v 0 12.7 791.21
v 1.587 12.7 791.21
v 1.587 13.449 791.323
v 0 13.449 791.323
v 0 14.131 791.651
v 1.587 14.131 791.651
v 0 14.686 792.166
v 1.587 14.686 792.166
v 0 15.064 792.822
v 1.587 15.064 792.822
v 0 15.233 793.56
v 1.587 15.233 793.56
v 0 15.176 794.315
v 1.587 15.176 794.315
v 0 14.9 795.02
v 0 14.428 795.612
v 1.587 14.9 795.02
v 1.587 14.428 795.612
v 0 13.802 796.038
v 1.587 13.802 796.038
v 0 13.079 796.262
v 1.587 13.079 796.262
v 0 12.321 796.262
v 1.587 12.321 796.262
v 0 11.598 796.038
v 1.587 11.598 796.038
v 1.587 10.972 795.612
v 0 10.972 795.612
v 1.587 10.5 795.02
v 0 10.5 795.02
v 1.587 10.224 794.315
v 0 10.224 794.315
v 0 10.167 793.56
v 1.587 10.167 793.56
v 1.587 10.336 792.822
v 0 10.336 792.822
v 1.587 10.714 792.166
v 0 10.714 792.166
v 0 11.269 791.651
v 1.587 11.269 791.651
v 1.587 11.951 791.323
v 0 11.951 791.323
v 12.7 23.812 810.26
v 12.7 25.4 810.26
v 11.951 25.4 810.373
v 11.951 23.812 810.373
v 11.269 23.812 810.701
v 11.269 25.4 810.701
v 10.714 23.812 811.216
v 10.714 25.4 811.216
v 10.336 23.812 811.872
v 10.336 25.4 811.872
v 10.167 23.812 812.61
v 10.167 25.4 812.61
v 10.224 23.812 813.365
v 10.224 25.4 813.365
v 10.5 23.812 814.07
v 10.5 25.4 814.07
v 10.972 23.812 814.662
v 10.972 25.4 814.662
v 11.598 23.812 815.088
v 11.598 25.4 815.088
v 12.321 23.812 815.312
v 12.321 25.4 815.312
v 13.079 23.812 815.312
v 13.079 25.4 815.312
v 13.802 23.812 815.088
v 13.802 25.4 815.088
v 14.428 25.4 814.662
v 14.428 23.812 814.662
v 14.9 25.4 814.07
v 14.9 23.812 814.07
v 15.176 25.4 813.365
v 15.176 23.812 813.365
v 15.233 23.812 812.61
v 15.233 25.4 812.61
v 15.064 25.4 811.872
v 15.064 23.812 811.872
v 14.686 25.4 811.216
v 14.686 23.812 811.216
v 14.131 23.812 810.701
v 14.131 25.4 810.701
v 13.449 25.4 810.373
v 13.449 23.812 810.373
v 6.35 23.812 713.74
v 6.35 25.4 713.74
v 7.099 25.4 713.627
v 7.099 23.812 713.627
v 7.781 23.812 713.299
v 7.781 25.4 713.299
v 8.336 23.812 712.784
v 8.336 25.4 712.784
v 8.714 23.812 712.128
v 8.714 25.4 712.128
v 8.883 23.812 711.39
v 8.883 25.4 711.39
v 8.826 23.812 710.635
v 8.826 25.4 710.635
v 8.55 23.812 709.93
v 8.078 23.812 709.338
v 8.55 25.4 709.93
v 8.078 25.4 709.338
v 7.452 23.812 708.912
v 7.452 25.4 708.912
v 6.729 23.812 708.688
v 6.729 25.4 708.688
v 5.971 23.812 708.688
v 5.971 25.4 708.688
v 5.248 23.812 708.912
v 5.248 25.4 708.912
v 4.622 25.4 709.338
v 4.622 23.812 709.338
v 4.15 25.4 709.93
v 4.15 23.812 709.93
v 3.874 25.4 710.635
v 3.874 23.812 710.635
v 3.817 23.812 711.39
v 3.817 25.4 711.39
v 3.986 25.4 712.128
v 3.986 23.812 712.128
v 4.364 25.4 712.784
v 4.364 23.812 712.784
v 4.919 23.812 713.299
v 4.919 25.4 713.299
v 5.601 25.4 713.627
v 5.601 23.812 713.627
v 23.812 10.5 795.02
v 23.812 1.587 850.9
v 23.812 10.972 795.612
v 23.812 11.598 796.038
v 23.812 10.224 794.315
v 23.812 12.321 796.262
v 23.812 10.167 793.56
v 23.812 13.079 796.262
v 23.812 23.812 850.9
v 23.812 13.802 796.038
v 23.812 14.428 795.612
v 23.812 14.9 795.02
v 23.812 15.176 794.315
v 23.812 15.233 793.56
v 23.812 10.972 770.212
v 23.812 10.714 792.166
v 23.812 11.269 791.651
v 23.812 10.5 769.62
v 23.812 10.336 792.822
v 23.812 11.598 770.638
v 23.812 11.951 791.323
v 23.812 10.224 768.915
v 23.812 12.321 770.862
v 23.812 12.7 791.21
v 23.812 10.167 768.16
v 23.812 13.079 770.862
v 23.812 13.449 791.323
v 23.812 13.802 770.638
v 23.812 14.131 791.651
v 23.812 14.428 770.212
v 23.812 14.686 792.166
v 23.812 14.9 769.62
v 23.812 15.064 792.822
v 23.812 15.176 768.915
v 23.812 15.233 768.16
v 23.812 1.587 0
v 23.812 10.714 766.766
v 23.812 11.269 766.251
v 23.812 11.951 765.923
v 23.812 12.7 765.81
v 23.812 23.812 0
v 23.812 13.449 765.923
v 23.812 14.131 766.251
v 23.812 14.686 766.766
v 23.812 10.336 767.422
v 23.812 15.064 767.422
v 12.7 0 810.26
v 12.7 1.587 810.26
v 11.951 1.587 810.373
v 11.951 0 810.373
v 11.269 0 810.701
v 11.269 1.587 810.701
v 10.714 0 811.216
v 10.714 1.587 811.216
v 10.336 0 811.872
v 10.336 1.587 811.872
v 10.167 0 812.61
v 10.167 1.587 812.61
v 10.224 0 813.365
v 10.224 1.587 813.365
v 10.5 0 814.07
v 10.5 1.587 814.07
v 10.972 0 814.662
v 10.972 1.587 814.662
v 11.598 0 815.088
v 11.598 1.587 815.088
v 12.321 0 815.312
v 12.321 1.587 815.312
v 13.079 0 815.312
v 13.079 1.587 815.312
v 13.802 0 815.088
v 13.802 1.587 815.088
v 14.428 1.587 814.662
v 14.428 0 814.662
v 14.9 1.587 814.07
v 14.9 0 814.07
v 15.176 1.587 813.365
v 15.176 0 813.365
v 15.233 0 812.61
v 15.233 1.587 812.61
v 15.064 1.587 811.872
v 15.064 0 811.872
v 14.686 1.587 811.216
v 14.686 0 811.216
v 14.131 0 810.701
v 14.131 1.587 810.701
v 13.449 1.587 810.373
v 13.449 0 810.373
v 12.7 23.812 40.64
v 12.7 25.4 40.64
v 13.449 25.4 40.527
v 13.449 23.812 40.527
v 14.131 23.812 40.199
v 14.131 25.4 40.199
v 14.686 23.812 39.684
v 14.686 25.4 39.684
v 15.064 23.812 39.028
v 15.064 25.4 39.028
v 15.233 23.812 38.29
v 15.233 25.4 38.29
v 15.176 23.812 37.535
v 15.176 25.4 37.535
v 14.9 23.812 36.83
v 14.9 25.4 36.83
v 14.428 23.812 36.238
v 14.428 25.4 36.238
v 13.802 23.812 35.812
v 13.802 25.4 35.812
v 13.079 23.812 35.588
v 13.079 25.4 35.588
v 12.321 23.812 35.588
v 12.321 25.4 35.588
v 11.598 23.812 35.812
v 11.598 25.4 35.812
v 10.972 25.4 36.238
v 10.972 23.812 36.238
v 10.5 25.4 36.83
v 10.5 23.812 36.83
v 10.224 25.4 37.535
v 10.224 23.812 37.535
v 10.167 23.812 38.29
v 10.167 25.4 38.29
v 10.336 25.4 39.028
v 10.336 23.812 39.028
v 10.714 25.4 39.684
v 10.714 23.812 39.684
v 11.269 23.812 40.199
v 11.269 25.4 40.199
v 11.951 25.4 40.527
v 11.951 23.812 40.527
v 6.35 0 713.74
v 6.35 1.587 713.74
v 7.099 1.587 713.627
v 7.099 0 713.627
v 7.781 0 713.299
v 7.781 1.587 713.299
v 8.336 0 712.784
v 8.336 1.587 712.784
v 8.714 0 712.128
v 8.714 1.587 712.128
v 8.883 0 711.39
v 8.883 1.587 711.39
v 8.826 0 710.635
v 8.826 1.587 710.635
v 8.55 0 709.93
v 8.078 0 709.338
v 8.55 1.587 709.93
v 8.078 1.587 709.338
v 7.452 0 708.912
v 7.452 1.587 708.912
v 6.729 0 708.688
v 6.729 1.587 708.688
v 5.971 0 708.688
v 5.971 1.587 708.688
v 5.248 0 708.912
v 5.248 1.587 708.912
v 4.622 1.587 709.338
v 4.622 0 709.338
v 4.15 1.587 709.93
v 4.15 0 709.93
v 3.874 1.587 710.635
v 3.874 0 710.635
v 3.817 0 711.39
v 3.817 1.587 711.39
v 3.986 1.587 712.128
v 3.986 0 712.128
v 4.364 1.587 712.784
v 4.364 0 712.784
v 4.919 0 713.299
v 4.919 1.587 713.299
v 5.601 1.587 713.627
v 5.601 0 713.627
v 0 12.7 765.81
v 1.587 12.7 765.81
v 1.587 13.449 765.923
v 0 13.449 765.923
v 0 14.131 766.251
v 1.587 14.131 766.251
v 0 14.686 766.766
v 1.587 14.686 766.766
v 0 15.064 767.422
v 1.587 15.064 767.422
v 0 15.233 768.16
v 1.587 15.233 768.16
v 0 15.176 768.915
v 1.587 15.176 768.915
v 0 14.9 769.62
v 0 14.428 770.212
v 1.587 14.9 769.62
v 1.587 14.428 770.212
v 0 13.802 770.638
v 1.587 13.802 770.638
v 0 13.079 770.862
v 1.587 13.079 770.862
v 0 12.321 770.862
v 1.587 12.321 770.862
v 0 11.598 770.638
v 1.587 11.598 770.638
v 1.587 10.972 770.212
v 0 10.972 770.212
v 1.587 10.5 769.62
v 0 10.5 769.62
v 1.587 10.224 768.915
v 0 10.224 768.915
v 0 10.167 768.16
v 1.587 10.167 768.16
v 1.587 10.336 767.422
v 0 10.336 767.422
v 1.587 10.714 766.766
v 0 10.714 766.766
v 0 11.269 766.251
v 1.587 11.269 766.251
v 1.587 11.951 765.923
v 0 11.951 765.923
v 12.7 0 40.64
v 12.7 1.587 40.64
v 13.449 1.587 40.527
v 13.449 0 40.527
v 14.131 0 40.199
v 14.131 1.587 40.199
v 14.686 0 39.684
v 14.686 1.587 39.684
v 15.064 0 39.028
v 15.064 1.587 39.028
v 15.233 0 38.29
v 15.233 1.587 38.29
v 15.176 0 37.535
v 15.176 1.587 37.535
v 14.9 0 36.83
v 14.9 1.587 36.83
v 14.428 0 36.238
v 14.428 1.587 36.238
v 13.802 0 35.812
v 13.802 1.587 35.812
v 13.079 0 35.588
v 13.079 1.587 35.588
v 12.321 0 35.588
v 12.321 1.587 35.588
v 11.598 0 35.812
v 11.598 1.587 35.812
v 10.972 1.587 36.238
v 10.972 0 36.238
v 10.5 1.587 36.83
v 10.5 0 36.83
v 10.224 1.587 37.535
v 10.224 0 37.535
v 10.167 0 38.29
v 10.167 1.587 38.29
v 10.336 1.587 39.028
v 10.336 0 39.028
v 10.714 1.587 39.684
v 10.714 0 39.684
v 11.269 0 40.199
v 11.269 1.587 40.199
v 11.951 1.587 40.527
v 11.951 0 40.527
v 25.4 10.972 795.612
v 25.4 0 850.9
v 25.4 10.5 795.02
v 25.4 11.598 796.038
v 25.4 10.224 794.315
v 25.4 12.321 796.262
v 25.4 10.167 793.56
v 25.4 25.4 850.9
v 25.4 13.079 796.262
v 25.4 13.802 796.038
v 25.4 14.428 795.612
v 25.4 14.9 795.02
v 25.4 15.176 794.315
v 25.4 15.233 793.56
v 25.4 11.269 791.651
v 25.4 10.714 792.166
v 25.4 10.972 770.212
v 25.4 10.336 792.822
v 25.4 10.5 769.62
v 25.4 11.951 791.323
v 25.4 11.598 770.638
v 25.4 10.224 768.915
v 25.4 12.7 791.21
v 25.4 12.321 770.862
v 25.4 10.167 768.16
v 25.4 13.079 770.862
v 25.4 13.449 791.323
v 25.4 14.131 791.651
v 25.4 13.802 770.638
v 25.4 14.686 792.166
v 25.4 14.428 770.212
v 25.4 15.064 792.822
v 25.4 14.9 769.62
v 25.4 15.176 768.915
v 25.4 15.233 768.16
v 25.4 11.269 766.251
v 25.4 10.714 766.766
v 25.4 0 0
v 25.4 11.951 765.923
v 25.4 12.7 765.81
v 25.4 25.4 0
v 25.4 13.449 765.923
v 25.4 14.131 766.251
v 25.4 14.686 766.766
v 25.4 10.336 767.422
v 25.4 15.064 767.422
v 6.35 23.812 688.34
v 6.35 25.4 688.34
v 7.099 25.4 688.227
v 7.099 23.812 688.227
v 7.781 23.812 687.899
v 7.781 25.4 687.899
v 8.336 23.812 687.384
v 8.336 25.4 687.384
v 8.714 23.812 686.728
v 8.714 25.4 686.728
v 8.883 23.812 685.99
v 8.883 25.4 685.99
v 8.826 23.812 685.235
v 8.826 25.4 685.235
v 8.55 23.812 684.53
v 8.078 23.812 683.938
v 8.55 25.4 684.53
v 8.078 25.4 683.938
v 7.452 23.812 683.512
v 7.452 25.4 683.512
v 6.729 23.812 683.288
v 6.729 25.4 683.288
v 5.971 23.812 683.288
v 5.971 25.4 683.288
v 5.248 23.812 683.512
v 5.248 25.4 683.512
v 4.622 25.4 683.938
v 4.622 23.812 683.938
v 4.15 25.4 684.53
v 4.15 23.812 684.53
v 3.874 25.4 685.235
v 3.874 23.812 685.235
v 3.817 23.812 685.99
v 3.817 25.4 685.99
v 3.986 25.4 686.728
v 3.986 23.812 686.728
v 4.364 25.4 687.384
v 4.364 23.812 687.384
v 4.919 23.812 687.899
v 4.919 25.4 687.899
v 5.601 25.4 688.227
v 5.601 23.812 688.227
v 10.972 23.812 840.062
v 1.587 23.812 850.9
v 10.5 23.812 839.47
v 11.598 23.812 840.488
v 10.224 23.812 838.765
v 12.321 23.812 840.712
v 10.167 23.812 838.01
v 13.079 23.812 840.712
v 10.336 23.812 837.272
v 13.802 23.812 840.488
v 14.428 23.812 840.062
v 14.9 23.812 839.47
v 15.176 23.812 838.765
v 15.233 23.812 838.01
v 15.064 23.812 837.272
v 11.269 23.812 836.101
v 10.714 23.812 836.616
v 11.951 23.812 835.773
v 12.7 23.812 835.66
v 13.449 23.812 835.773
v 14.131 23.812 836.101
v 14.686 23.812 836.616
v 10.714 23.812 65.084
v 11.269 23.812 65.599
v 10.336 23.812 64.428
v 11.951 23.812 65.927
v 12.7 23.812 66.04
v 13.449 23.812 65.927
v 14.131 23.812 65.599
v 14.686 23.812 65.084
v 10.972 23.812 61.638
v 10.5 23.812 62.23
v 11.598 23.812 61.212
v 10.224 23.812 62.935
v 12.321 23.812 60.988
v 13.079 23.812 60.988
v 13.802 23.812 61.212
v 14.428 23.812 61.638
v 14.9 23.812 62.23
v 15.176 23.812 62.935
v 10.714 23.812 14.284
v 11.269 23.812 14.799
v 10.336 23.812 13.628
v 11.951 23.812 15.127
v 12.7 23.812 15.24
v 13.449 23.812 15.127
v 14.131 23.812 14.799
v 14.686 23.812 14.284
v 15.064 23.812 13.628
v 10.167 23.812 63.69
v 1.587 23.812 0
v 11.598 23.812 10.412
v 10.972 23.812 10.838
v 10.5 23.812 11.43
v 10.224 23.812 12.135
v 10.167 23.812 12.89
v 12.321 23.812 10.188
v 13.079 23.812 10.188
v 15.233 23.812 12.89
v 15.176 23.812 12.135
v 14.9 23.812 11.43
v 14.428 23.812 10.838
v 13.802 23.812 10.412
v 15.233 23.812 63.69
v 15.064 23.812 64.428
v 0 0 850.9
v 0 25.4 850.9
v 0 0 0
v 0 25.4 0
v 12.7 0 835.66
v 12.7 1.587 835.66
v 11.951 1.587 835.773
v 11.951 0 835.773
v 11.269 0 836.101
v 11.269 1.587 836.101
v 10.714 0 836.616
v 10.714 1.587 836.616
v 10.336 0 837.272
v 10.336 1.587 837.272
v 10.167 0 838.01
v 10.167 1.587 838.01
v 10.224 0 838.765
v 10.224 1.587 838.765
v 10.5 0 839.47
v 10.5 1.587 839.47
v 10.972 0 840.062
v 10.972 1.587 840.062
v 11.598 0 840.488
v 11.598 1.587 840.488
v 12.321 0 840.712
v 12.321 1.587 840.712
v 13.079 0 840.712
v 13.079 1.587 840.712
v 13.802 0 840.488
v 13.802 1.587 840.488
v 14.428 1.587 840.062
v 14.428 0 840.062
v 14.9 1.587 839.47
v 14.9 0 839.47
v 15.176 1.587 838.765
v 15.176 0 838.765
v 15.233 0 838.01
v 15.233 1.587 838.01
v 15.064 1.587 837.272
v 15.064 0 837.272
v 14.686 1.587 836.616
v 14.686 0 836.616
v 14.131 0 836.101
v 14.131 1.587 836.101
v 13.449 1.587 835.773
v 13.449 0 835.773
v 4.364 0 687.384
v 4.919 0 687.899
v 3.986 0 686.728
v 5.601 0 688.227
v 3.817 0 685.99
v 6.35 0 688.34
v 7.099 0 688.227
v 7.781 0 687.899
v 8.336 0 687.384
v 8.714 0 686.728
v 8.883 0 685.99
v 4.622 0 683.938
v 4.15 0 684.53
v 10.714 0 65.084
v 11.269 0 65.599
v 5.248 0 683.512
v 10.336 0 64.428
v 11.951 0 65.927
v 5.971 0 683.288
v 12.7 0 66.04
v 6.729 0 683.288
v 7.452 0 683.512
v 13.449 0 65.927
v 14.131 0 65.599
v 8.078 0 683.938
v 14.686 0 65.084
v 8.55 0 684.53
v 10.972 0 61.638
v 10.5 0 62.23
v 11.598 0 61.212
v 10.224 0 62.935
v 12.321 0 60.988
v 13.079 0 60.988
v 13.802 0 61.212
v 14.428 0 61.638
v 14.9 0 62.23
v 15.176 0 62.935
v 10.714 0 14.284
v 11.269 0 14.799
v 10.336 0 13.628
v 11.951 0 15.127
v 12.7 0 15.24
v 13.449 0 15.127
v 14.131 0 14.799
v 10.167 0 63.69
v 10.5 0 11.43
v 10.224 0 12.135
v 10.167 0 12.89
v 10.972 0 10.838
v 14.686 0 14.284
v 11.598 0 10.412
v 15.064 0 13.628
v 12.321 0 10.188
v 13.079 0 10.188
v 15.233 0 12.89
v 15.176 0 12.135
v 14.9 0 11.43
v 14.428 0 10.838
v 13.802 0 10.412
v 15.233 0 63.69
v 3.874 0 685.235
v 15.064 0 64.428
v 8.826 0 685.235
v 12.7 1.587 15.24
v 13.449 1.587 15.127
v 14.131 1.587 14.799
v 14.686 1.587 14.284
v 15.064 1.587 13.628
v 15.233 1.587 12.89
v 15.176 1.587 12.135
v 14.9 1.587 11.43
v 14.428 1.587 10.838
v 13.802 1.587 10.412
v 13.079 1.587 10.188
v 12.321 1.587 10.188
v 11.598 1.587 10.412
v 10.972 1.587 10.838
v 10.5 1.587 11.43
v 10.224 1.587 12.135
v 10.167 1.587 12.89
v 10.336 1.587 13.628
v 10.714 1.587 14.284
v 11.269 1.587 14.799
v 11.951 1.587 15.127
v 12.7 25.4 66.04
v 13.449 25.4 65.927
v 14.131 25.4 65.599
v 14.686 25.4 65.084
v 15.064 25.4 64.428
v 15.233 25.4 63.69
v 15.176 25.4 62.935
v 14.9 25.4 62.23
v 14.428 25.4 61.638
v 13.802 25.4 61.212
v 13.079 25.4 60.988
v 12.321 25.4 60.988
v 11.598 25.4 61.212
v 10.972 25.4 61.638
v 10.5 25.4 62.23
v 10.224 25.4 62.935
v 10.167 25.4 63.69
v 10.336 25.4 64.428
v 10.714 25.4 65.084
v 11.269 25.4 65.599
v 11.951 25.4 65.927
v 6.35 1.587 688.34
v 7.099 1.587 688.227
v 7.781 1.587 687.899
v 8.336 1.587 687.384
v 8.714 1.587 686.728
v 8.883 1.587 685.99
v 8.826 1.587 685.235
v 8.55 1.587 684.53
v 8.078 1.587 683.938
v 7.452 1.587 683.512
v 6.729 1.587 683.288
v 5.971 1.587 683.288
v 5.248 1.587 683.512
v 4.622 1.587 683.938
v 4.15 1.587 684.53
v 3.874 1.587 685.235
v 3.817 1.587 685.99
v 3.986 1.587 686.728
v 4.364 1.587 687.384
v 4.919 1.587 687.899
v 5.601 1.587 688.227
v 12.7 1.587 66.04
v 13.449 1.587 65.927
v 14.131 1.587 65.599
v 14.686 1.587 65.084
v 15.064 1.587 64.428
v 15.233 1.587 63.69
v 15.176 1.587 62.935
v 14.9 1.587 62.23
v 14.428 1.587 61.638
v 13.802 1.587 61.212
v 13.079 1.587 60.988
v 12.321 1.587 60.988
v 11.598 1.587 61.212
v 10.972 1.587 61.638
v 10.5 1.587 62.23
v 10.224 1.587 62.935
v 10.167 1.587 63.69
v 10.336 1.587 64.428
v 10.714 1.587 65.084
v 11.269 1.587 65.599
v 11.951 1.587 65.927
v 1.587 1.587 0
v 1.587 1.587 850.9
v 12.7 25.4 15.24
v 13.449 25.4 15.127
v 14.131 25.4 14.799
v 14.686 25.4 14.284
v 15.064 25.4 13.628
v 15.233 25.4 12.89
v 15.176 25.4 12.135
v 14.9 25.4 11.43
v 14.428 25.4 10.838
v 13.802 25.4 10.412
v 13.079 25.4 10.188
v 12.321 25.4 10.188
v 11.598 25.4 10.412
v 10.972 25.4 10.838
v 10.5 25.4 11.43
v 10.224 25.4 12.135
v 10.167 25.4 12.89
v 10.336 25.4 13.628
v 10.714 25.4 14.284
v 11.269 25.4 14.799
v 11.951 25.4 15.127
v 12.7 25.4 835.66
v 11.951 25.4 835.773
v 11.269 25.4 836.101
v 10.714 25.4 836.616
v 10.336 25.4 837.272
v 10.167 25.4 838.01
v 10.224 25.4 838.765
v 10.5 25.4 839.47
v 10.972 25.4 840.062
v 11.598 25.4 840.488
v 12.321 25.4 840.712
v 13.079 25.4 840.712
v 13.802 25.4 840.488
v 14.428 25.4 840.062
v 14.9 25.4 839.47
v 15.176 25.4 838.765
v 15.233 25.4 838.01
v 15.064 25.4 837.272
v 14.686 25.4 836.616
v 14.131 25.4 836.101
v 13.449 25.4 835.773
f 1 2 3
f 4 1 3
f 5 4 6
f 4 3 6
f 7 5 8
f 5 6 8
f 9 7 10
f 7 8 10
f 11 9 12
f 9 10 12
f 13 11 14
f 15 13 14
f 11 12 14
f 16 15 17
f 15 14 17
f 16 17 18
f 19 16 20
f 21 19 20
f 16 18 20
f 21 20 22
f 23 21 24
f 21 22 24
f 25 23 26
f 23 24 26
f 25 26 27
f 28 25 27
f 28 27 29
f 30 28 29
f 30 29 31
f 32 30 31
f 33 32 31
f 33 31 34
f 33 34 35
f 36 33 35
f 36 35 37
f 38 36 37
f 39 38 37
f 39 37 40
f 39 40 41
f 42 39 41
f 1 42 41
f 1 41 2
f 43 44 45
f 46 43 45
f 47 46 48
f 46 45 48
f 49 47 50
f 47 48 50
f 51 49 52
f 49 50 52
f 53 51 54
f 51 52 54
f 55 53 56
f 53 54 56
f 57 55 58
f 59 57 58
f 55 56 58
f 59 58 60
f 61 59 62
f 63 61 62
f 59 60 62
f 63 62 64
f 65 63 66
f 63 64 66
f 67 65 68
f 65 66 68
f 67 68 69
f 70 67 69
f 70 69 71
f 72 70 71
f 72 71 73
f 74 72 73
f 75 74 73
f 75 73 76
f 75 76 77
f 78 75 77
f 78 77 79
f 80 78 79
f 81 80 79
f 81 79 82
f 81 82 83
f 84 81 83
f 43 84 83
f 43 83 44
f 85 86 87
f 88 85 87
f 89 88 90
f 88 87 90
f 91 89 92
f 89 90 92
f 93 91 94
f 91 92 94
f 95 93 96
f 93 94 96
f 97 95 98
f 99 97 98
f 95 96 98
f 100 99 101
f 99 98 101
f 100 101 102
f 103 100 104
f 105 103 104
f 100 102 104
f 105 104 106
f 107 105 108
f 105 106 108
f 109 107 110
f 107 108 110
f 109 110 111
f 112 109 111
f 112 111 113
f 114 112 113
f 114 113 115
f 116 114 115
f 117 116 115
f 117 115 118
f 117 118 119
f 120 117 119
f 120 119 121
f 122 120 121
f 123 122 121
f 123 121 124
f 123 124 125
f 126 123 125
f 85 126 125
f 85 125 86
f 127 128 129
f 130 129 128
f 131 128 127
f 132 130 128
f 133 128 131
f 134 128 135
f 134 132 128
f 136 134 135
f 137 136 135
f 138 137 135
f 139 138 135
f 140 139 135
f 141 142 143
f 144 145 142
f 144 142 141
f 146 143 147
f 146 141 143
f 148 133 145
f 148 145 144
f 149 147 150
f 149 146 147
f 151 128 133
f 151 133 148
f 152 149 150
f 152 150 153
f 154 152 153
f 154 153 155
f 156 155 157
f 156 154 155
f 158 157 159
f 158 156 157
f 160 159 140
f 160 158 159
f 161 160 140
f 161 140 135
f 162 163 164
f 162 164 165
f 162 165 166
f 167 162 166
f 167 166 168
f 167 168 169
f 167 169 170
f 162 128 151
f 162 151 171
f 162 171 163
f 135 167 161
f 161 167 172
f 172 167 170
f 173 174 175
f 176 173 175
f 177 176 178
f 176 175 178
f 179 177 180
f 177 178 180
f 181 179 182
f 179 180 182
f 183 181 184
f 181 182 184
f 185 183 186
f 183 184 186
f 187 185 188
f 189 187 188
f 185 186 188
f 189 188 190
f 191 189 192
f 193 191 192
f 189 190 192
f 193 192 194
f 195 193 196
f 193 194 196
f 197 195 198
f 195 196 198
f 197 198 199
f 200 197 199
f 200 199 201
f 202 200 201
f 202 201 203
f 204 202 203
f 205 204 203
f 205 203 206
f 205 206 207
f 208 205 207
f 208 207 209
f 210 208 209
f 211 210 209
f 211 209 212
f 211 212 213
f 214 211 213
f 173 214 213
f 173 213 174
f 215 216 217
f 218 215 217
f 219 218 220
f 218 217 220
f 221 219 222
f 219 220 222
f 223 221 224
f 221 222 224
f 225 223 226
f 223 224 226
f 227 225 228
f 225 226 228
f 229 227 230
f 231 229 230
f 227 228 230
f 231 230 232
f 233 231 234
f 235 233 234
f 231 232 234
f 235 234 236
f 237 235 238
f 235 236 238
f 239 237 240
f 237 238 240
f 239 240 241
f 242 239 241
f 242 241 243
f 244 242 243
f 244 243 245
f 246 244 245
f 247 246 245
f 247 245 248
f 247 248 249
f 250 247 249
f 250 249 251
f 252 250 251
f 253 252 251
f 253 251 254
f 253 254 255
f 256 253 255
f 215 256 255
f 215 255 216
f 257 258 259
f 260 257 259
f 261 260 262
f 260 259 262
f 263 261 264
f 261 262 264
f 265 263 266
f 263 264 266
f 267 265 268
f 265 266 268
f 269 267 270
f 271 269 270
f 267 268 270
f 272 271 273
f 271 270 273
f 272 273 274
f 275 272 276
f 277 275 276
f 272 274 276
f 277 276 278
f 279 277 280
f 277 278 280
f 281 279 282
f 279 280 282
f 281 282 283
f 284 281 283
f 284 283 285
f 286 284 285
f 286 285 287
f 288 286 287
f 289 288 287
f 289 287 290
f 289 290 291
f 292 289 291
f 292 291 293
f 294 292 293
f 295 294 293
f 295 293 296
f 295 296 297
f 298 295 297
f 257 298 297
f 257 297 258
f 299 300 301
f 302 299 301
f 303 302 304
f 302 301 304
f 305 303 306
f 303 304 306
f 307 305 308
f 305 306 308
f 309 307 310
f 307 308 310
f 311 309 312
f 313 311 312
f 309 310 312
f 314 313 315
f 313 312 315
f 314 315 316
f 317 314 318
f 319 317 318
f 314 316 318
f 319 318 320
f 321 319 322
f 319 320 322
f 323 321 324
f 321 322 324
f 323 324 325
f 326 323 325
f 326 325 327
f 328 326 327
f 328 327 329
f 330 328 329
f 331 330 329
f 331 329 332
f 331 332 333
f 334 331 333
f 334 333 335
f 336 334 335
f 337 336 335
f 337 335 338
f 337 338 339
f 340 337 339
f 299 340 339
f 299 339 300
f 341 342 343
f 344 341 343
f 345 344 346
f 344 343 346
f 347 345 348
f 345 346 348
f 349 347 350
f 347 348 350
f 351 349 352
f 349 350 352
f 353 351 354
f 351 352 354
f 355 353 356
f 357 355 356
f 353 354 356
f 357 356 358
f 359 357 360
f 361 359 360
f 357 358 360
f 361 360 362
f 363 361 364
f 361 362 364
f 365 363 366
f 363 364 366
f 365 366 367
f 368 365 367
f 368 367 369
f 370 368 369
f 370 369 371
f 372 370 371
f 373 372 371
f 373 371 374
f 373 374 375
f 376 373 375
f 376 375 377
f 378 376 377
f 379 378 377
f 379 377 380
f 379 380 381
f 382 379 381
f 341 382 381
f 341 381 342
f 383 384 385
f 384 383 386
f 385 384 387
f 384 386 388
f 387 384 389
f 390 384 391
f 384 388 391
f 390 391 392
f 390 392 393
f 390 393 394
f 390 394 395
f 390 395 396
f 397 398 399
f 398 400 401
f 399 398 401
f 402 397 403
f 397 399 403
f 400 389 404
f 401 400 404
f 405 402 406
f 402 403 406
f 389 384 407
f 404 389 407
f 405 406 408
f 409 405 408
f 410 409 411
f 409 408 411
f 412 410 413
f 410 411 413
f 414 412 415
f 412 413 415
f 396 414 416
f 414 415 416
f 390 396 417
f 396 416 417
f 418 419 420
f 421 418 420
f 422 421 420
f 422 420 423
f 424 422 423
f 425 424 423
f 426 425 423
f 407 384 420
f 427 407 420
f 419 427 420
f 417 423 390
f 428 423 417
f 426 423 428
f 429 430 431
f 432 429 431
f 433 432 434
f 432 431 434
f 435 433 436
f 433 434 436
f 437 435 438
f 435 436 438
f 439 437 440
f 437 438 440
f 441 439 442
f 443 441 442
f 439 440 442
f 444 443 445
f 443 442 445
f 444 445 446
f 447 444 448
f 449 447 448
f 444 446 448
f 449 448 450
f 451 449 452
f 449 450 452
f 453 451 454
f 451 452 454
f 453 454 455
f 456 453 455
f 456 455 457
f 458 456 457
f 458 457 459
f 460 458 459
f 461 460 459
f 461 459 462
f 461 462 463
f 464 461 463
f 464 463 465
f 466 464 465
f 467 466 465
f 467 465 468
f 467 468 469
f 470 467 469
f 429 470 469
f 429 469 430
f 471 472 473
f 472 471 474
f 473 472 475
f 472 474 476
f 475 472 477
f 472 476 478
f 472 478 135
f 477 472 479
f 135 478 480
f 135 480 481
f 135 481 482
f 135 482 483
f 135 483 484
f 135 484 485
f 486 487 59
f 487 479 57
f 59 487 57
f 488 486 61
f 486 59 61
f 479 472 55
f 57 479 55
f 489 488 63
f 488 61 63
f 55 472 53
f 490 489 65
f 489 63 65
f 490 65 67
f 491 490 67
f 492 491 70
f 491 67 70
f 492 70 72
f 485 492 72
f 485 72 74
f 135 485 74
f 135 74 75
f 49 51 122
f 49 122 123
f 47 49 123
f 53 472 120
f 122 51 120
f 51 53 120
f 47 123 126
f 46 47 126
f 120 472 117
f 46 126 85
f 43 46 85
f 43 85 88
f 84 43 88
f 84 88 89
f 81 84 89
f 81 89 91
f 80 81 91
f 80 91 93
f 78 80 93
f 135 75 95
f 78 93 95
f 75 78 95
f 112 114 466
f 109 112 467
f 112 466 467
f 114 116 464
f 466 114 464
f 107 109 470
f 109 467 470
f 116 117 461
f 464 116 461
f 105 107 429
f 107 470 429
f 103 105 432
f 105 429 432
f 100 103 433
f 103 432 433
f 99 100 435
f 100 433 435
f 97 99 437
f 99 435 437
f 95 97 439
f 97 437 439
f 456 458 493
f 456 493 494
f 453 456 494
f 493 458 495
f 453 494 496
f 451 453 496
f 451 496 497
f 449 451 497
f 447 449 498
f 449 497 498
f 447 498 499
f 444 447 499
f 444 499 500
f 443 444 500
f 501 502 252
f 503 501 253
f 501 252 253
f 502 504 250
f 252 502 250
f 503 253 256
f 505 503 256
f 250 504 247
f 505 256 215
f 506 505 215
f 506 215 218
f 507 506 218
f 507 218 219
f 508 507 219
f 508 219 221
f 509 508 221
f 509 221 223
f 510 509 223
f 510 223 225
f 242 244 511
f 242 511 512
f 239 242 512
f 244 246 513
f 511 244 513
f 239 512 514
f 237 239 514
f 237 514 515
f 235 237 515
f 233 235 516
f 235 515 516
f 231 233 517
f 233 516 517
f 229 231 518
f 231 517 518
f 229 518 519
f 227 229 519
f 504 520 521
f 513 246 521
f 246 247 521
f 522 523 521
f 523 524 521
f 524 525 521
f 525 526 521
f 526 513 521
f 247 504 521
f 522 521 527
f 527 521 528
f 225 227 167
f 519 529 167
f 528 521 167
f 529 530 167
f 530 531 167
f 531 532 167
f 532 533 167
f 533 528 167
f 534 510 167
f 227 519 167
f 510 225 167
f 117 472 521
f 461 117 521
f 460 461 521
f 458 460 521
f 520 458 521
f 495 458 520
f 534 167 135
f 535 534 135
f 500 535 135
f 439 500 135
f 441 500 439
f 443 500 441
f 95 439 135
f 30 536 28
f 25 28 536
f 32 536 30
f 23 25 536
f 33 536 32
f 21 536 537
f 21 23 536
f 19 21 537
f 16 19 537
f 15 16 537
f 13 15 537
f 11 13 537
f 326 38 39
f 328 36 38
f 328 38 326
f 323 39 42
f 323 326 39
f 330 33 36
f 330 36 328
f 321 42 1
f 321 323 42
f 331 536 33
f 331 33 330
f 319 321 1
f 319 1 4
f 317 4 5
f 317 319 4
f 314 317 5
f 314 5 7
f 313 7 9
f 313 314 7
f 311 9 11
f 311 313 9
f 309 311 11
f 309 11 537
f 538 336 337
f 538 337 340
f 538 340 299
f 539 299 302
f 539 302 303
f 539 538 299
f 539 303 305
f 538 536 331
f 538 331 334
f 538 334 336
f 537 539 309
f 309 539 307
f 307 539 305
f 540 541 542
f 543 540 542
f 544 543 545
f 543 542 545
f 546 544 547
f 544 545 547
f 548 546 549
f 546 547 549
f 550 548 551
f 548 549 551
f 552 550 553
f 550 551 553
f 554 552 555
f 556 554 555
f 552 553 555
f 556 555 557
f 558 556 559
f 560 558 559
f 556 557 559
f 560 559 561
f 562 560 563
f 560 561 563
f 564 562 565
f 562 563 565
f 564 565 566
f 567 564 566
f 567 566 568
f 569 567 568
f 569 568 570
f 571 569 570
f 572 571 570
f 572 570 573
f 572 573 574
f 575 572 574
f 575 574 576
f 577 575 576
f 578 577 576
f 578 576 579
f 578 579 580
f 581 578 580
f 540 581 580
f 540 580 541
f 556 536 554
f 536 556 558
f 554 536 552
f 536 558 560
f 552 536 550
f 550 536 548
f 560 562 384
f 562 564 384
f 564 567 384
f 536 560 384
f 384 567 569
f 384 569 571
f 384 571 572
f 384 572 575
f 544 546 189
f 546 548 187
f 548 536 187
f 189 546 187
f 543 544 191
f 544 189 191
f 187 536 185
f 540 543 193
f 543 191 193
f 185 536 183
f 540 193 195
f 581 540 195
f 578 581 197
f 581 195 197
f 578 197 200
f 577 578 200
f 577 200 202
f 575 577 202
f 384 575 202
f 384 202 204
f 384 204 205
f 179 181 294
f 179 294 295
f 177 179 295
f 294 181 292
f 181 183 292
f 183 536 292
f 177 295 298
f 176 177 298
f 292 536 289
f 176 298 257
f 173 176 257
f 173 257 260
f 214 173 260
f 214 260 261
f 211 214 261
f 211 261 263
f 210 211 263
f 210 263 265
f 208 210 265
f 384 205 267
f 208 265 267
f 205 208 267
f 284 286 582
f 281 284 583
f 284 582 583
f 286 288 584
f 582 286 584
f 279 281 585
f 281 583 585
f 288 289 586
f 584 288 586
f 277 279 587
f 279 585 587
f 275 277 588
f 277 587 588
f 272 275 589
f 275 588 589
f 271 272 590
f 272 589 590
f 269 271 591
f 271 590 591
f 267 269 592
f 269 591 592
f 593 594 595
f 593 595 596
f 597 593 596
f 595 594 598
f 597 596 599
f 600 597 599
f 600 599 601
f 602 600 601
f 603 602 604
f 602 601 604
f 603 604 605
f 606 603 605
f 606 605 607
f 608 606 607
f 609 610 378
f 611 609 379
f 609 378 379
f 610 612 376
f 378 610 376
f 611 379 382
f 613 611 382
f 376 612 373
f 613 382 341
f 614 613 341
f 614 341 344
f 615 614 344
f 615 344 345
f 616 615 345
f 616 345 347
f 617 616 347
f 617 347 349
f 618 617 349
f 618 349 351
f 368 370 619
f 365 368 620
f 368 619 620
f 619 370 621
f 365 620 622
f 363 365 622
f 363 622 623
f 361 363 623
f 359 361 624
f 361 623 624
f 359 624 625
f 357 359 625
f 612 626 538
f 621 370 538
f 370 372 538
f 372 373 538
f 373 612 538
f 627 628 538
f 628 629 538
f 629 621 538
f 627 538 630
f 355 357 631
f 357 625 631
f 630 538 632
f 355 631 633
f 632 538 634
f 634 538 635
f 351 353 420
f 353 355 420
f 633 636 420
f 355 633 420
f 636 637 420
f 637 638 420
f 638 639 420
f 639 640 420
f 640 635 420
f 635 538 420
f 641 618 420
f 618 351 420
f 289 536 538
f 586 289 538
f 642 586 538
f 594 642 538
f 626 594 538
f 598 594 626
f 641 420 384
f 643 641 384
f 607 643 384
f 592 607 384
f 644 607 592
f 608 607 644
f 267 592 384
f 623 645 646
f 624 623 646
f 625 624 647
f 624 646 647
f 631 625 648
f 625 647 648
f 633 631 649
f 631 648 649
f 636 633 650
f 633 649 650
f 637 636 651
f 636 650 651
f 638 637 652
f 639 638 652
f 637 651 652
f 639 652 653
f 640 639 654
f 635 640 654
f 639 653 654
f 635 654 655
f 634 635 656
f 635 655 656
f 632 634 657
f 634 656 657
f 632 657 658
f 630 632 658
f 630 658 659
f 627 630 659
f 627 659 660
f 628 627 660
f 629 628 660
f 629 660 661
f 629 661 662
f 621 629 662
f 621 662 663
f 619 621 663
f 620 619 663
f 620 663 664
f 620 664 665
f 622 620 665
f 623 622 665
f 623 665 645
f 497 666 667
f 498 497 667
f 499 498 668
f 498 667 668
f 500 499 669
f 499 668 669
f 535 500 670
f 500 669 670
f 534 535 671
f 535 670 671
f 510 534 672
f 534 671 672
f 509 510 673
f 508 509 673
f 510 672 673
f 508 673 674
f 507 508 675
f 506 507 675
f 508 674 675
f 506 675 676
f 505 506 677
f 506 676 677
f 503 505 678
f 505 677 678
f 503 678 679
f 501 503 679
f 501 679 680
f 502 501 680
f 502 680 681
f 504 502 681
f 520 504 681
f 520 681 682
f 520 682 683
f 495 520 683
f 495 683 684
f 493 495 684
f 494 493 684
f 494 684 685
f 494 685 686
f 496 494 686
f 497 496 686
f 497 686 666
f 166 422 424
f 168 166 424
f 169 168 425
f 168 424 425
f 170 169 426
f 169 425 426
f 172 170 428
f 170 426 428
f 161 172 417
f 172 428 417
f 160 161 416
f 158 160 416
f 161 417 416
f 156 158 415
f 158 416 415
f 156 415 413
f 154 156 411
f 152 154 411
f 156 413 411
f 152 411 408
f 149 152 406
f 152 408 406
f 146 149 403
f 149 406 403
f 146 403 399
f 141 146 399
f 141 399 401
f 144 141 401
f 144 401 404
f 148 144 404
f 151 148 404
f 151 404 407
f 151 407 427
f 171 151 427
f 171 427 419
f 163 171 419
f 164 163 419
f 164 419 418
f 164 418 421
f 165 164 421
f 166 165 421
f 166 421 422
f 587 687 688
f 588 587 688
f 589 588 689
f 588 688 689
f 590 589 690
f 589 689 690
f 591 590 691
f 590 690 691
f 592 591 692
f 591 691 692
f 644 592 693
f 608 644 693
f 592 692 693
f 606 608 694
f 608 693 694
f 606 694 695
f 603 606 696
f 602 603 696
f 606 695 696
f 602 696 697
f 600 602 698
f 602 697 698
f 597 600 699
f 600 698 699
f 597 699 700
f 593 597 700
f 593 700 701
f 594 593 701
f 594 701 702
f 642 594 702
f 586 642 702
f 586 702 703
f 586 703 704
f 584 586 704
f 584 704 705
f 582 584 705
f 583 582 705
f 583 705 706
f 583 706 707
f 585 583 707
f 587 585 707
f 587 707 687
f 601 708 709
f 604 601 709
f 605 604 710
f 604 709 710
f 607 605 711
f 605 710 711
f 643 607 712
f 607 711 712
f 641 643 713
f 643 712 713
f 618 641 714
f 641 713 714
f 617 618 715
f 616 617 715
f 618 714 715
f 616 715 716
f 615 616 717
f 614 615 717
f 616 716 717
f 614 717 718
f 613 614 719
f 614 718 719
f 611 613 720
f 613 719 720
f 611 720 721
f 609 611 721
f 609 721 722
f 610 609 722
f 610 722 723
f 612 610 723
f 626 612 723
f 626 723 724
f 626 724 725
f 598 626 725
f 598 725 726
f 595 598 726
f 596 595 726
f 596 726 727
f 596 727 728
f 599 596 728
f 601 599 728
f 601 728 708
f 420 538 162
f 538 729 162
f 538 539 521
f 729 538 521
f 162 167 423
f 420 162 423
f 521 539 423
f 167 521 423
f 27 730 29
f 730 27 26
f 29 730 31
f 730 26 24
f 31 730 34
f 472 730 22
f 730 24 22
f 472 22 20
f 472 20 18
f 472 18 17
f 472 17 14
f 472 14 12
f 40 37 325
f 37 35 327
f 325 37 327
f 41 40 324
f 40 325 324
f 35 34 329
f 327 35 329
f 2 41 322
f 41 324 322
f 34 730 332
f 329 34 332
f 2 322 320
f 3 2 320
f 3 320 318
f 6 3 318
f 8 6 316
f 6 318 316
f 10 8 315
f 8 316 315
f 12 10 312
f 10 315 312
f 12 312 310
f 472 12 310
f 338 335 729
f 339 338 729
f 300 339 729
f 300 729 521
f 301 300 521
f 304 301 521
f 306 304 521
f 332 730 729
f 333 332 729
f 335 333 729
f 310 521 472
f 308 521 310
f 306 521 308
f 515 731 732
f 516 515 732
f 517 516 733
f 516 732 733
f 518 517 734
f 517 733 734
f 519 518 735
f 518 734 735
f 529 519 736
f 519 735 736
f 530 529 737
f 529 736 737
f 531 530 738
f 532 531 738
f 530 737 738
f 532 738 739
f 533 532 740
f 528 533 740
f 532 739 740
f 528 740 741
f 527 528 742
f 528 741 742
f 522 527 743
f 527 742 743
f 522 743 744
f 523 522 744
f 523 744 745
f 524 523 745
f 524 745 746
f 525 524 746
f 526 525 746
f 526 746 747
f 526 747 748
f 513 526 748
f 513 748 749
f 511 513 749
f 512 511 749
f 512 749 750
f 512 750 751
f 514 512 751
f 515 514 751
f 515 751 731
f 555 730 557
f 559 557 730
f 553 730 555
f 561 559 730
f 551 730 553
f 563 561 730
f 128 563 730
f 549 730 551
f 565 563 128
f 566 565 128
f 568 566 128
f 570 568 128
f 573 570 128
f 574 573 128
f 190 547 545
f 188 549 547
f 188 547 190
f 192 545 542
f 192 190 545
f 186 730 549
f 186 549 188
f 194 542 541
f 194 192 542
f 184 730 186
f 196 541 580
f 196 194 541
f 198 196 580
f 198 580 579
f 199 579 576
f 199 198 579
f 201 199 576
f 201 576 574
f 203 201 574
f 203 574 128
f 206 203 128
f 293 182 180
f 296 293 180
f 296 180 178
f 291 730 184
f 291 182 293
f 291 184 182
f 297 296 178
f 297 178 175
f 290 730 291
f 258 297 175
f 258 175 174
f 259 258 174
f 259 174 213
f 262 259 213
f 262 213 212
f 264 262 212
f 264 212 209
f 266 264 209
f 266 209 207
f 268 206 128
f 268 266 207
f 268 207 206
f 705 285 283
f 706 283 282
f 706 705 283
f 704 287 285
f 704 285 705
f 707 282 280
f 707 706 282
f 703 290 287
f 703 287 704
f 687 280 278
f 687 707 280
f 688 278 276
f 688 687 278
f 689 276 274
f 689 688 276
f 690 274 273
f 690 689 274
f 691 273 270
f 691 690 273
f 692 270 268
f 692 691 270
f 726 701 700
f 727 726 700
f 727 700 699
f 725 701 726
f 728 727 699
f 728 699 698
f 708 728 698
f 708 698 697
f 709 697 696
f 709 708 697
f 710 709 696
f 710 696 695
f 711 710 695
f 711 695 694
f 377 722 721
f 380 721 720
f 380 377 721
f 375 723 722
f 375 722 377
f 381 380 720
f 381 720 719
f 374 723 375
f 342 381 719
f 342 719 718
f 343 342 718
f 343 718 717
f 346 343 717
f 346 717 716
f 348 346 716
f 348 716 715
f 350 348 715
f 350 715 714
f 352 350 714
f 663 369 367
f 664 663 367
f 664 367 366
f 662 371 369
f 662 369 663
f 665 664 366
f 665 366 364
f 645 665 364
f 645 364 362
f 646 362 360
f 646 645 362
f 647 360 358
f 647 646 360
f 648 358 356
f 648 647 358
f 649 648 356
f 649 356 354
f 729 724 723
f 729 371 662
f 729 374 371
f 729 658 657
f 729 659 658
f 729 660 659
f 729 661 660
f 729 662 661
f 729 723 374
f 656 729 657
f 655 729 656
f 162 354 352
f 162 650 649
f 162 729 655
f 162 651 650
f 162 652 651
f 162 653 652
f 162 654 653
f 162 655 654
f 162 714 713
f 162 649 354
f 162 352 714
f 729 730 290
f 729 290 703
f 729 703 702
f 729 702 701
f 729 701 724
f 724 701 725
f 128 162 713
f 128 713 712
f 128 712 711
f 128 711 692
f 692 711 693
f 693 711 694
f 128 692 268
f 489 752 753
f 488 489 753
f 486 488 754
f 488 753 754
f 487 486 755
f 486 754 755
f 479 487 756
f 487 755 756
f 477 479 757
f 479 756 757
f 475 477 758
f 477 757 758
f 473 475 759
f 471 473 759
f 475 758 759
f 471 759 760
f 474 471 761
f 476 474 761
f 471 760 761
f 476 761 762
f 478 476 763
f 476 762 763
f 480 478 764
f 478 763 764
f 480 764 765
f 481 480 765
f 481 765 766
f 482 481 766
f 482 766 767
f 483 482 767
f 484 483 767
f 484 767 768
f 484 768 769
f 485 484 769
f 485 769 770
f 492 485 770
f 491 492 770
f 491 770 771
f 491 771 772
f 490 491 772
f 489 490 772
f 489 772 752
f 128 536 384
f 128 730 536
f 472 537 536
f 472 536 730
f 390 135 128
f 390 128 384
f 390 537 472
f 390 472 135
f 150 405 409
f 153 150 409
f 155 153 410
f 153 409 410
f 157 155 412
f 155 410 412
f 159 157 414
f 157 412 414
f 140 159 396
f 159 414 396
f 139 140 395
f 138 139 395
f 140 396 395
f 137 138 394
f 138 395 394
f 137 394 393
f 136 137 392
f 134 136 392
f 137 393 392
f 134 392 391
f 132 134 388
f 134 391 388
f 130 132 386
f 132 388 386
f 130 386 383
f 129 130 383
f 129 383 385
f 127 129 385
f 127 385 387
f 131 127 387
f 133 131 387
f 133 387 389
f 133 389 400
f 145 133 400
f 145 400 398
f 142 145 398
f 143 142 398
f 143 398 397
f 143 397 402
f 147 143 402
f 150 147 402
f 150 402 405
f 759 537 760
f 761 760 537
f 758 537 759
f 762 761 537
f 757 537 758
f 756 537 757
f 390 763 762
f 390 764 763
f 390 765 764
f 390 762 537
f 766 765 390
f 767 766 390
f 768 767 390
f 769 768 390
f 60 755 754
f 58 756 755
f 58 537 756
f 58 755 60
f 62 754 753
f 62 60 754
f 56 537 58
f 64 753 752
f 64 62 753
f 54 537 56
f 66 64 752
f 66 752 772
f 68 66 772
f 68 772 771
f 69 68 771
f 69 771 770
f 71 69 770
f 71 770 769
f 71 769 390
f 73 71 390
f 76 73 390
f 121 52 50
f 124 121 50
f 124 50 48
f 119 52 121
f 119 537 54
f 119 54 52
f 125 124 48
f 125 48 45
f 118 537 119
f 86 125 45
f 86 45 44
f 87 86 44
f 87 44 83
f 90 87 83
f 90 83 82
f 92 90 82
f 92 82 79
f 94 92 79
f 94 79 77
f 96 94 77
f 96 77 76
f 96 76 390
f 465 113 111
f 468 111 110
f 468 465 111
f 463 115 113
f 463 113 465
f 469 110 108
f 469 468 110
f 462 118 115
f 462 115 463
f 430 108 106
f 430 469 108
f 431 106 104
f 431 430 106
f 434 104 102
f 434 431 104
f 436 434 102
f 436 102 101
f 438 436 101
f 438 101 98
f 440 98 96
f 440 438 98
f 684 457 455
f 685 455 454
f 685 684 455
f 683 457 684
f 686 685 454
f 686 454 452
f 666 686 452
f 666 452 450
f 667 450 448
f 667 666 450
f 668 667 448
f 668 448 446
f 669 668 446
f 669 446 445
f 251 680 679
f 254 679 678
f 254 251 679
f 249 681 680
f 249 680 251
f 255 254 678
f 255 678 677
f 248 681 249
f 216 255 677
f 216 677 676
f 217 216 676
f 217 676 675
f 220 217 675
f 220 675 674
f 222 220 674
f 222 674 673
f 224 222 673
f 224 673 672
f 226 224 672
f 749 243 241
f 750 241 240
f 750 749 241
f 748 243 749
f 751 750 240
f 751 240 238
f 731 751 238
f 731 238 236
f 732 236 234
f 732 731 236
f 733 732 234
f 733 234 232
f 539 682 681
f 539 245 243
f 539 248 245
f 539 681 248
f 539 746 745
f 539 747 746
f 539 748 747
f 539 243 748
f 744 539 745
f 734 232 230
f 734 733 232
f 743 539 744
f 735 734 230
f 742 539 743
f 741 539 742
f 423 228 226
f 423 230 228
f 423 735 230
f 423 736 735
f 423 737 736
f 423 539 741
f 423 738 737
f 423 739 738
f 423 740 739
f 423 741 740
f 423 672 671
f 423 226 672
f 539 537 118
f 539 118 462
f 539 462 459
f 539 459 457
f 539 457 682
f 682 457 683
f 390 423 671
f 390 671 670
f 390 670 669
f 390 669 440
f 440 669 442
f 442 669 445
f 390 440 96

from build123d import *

# Parameters (mm, degrees)
SKETCH1_W           = 25.4
SKETCH1_H           = 25.4
SKETCH1_W_2         = 22.225
SKETCH1_H_2         = 22.225
BOSS_EXTRUDE1_DEPTH = 850.9
SKETCH3_R           = 2.54
CUT_EXTRUDE2_DEPTH  = 852.657871448
SKETCH4_R           = 2.54
CUT_EXTRUDE3_DEPTH  = 852.657871448


with BuildPart() as part:
    # Sketch1 → Boss-Extrude1 (new body)
    with BuildSketch(Plane.XY):
        with Locations((12.7, 12.7)):
            Rectangle(SKETCH1_W, SKETCH1_H)
        with Locations((12.7, 12.7)):
            Rectangle(SKETCH1_W_2, SKETCH1_H_2, mode=Mode.SUBTRACT)
    extrude(amount=BOSS_EXTRUDE1_DEPTH)

    # Sketch3 → Cut-Extrude2 (cut, through all)
    with BuildSketch(Plane(origin=(0, 25.4, 0), x_dir=(1, 0, 0), z_dir=(0, 1, 0))):
        with Locations(Location((12.7, -812.8, 0), (0, 0, 90))):
            Circle(SKETCH3_R)
        with Locations(Location((12.7, -838.2, 0), (0, 0, 90))):
            Circle(SKETCH3_R)
        with Locations(Location((12.7, -12.7, 0), (0, 0, 270))):
            Circle(SKETCH3_R)
        with Locations(Location((12.7, -38.1, 0), (0, 0, 270))):
            Circle(SKETCH3_R)
        with Locations(Location((12.7, -63.5, 0), (0, 0, 270))):
            Circle(SKETCH3_R)
        with Locations(Location((6.35, -711.2, 0), (0, 0, 270))):
            Circle(SKETCH3_R)
        with Locations(Location((6.35, -685.8, 0), (0, 0, 270))):
            Circle(SKETCH3_R)
    extrude(amount=-CUT_EXTRUDE2_DEPTH, mode=Mode.SUBTRACT)

    # Sketch4 → Cut-Extrude3 (cut, through all)
    with BuildSketch(Plane(origin=(25.4, 0, 0), x_dir=(0, 0, -1), z_dir=(1, 0, 0))):
        with Locations((-793.75, 12.7)):
            Circle(SKETCH4_R)
        with Locations((-768.35, 12.7)):
            Circle(SKETCH4_R)
    extrude(amount=-CUT_EXTRUDE3_DEPTH, mode=Mode.SUBTRACT)


solid = part.part
